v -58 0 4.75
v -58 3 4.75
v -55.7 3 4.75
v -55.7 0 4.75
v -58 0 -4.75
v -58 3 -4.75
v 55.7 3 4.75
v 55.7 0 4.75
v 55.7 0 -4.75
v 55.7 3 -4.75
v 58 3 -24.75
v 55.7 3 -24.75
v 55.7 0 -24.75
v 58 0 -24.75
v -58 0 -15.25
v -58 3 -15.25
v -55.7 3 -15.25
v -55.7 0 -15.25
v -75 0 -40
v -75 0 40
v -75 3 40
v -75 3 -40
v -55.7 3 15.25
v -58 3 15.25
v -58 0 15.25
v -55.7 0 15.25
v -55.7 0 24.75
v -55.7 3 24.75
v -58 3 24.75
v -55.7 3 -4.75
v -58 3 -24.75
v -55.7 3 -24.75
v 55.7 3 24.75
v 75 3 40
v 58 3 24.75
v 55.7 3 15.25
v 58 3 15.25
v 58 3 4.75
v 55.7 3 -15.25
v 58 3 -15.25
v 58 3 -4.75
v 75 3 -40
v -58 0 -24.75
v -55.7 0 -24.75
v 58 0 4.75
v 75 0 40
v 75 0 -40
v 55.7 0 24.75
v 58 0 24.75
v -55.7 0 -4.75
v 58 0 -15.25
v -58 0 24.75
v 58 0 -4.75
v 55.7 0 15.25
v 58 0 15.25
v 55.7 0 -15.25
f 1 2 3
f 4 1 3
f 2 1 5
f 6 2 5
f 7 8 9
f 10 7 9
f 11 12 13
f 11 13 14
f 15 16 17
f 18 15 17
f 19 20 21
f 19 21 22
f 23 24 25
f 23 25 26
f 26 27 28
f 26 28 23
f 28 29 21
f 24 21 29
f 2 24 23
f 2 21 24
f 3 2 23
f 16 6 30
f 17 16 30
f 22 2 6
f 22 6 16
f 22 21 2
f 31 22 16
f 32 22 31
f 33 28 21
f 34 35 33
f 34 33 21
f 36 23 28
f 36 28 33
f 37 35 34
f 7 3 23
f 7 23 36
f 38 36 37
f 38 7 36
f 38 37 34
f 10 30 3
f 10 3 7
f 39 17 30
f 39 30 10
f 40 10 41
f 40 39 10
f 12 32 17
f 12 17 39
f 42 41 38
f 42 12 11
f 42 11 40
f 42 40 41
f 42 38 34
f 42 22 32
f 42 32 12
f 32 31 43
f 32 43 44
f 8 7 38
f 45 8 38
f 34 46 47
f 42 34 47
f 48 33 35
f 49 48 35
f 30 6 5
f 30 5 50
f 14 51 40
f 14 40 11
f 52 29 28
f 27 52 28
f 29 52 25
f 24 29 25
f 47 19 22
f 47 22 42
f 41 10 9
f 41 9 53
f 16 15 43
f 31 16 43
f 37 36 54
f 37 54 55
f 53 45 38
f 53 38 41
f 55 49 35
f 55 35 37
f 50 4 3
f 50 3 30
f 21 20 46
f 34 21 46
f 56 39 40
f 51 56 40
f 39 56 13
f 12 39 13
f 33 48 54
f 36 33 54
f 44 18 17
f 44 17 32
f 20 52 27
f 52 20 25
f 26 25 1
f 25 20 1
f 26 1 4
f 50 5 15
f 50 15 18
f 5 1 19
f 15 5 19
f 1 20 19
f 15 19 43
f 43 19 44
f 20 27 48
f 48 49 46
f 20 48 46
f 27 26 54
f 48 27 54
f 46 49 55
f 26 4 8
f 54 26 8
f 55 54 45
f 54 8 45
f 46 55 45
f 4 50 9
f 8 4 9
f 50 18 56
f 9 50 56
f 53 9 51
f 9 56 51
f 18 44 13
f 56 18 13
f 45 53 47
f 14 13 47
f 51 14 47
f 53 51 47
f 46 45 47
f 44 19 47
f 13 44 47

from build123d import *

# Parameters (mm, degrees)
CROQUIS1_W              = 150
CROQUIS1_H              = 80
CROQUIS1_W_2            = 2.3
CROQUIS1_H_2            = 9.5
SALIENTE_EXTRUIR1_DEPTH = 3


with BuildPart() as part:
    # Croquis1 → Saliente-Extruir1 (new body)
    with BuildSketch(Plane(origin=(0, 0, 0), x_dir=(1, 0, 0), z_dir=(0, 1, 0))):
        Rectangle(CROQUIS1_W, CROQUIS1_H)
        with Locations((56.85, 20)):
            Rectangle(CROQUIS1_W_2, CROQUIS1_H_2, mode=Mode.SUBTRACT)
        with Locations((56.85, 0)):
            Rectangle(CROQUIS1_W_2, CROQUIS1_H_2, mode=Mode.SUBTRACT)
        with Locations((56.85, -20)):
            Rectangle(CROQUIS1_W_2, CROQUIS1_H_2, mode=Mode.SUBTRACT)
        with Locations((-56.85, 20)):
            Rectangle(CROQUIS1_W_2, CROQUIS1_H_2, mode=Mode.SUBTRACT)
        with Locations((-56.85, -20)):
            Rectangle(CROQUIS1_W_2, CROQUIS1_H_2, mode=Mode.SUBTRACT)
        with Locations((-56.85, 0)):
            Rectangle(CROQUIS1_W_2, CROQUIS1_H_2, mode=Mode.SUBTRACT)
    extrude(amount=SALIENTE_EXTRUIR1_DEPTH)


solid = part.part
